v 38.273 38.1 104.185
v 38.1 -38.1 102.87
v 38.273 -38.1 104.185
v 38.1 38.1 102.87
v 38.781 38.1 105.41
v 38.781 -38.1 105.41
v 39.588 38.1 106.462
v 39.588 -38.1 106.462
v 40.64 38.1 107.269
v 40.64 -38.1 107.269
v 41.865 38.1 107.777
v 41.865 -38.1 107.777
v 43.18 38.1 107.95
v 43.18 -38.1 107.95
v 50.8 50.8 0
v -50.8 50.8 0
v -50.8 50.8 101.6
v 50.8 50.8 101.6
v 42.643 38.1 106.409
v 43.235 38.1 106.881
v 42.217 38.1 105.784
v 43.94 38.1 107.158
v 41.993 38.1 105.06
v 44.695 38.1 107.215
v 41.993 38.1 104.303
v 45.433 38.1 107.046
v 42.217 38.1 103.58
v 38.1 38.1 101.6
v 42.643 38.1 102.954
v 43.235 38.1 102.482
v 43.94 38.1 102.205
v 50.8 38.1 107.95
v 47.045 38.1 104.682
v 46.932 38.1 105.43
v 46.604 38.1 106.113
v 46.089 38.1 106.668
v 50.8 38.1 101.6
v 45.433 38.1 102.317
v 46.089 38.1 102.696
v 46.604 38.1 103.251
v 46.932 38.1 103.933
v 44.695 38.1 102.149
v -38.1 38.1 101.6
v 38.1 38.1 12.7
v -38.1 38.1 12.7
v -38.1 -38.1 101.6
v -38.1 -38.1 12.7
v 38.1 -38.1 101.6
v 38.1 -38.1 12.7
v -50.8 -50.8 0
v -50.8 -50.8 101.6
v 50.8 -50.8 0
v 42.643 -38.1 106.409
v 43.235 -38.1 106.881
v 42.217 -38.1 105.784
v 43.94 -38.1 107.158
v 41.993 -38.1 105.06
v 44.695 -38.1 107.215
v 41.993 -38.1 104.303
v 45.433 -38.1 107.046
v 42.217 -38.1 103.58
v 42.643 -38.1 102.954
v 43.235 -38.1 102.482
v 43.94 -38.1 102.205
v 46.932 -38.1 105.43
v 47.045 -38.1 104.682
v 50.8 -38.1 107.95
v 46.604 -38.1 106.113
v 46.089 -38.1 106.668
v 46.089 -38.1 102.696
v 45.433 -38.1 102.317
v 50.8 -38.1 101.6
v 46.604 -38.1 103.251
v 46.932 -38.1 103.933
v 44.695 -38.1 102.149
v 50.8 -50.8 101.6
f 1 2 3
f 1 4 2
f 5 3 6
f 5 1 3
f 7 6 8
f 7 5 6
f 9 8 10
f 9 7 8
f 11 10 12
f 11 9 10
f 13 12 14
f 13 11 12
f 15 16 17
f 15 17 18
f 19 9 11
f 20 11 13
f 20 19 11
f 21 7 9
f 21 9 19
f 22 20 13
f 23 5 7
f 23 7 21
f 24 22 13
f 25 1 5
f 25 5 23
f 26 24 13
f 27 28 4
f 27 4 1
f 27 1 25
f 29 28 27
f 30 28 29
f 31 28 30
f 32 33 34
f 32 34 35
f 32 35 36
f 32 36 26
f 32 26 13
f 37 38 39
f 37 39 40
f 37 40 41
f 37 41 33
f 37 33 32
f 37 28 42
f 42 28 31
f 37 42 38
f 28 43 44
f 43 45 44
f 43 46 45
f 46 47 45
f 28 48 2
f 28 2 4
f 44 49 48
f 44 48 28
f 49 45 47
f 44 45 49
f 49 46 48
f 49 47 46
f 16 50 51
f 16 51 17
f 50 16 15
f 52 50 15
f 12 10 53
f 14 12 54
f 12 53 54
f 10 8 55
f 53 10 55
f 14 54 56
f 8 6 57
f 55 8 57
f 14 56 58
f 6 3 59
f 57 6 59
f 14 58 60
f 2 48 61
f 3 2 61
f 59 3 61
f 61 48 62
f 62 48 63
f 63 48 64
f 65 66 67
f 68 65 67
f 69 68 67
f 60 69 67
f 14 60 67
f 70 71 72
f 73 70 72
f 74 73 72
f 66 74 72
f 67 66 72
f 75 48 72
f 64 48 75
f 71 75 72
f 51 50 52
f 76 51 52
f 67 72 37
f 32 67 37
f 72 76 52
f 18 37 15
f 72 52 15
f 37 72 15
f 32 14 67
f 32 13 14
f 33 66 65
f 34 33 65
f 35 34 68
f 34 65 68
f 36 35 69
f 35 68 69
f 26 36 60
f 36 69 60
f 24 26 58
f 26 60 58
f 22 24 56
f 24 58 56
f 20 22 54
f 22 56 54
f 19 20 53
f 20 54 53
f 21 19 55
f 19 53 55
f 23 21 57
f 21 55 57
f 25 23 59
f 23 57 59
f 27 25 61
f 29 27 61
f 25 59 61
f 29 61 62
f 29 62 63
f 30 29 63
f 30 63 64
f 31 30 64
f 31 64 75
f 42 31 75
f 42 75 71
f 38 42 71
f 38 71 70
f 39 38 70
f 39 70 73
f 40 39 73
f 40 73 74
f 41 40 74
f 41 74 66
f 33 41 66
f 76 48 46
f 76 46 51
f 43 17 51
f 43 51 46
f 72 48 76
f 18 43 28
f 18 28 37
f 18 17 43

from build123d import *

# Parameters (mm, degrees)
F0_W     = 101.6
F0_H     = 101.6
F1_DEPTH = 101.6
F2_T     = -12.7
F3_W     = 12.7
F3_H     = 76.2
F4_DEPTH = 6.35
F5_R     = 2.54
F6_DEPTH = 95.885
F7_R     = 5.08


with BuildPart() as f1:
    # F0 (on Top) → F1 (new body)
    with BuildSketch(Plane.XY):
        Rectangle(F0_W, F0_H)
    extrude(amount=F1_DEPTH)

    # F2
    f2_openings = [f1.faces().sort_by_distance(p)[0] for p in [
        (0, 0, 101.6),
    ]]
    offset(amount=F2_T, openings=f2_openings)

    # F3 (on face) → F4 (join)
    with BuildSketch(Plane.XY.offset(101.6)):
        with Locations((44.45, 0)):
            Rectangle(F3_W, F3_H)
    extrude(amount=F4_DEPTH)

    # F5 (on face) → F6 (cut)
    with BuildSketch(Plane.XZ.offset(38.1)):
        with Locations((44.505034, 104.681725)):
            Circle(F5_R)
    extrude(amount=-F6_DEPTH, mode=Mode.SUBTRACT)

    # F7
    f7_edges = [f1.edges().sort_by_distance(p)[0] for p in [
        (38.1, 0, 107.95),
    ]]
    fillet(f7_edges, radius=F7_R)


solid = f1.part
